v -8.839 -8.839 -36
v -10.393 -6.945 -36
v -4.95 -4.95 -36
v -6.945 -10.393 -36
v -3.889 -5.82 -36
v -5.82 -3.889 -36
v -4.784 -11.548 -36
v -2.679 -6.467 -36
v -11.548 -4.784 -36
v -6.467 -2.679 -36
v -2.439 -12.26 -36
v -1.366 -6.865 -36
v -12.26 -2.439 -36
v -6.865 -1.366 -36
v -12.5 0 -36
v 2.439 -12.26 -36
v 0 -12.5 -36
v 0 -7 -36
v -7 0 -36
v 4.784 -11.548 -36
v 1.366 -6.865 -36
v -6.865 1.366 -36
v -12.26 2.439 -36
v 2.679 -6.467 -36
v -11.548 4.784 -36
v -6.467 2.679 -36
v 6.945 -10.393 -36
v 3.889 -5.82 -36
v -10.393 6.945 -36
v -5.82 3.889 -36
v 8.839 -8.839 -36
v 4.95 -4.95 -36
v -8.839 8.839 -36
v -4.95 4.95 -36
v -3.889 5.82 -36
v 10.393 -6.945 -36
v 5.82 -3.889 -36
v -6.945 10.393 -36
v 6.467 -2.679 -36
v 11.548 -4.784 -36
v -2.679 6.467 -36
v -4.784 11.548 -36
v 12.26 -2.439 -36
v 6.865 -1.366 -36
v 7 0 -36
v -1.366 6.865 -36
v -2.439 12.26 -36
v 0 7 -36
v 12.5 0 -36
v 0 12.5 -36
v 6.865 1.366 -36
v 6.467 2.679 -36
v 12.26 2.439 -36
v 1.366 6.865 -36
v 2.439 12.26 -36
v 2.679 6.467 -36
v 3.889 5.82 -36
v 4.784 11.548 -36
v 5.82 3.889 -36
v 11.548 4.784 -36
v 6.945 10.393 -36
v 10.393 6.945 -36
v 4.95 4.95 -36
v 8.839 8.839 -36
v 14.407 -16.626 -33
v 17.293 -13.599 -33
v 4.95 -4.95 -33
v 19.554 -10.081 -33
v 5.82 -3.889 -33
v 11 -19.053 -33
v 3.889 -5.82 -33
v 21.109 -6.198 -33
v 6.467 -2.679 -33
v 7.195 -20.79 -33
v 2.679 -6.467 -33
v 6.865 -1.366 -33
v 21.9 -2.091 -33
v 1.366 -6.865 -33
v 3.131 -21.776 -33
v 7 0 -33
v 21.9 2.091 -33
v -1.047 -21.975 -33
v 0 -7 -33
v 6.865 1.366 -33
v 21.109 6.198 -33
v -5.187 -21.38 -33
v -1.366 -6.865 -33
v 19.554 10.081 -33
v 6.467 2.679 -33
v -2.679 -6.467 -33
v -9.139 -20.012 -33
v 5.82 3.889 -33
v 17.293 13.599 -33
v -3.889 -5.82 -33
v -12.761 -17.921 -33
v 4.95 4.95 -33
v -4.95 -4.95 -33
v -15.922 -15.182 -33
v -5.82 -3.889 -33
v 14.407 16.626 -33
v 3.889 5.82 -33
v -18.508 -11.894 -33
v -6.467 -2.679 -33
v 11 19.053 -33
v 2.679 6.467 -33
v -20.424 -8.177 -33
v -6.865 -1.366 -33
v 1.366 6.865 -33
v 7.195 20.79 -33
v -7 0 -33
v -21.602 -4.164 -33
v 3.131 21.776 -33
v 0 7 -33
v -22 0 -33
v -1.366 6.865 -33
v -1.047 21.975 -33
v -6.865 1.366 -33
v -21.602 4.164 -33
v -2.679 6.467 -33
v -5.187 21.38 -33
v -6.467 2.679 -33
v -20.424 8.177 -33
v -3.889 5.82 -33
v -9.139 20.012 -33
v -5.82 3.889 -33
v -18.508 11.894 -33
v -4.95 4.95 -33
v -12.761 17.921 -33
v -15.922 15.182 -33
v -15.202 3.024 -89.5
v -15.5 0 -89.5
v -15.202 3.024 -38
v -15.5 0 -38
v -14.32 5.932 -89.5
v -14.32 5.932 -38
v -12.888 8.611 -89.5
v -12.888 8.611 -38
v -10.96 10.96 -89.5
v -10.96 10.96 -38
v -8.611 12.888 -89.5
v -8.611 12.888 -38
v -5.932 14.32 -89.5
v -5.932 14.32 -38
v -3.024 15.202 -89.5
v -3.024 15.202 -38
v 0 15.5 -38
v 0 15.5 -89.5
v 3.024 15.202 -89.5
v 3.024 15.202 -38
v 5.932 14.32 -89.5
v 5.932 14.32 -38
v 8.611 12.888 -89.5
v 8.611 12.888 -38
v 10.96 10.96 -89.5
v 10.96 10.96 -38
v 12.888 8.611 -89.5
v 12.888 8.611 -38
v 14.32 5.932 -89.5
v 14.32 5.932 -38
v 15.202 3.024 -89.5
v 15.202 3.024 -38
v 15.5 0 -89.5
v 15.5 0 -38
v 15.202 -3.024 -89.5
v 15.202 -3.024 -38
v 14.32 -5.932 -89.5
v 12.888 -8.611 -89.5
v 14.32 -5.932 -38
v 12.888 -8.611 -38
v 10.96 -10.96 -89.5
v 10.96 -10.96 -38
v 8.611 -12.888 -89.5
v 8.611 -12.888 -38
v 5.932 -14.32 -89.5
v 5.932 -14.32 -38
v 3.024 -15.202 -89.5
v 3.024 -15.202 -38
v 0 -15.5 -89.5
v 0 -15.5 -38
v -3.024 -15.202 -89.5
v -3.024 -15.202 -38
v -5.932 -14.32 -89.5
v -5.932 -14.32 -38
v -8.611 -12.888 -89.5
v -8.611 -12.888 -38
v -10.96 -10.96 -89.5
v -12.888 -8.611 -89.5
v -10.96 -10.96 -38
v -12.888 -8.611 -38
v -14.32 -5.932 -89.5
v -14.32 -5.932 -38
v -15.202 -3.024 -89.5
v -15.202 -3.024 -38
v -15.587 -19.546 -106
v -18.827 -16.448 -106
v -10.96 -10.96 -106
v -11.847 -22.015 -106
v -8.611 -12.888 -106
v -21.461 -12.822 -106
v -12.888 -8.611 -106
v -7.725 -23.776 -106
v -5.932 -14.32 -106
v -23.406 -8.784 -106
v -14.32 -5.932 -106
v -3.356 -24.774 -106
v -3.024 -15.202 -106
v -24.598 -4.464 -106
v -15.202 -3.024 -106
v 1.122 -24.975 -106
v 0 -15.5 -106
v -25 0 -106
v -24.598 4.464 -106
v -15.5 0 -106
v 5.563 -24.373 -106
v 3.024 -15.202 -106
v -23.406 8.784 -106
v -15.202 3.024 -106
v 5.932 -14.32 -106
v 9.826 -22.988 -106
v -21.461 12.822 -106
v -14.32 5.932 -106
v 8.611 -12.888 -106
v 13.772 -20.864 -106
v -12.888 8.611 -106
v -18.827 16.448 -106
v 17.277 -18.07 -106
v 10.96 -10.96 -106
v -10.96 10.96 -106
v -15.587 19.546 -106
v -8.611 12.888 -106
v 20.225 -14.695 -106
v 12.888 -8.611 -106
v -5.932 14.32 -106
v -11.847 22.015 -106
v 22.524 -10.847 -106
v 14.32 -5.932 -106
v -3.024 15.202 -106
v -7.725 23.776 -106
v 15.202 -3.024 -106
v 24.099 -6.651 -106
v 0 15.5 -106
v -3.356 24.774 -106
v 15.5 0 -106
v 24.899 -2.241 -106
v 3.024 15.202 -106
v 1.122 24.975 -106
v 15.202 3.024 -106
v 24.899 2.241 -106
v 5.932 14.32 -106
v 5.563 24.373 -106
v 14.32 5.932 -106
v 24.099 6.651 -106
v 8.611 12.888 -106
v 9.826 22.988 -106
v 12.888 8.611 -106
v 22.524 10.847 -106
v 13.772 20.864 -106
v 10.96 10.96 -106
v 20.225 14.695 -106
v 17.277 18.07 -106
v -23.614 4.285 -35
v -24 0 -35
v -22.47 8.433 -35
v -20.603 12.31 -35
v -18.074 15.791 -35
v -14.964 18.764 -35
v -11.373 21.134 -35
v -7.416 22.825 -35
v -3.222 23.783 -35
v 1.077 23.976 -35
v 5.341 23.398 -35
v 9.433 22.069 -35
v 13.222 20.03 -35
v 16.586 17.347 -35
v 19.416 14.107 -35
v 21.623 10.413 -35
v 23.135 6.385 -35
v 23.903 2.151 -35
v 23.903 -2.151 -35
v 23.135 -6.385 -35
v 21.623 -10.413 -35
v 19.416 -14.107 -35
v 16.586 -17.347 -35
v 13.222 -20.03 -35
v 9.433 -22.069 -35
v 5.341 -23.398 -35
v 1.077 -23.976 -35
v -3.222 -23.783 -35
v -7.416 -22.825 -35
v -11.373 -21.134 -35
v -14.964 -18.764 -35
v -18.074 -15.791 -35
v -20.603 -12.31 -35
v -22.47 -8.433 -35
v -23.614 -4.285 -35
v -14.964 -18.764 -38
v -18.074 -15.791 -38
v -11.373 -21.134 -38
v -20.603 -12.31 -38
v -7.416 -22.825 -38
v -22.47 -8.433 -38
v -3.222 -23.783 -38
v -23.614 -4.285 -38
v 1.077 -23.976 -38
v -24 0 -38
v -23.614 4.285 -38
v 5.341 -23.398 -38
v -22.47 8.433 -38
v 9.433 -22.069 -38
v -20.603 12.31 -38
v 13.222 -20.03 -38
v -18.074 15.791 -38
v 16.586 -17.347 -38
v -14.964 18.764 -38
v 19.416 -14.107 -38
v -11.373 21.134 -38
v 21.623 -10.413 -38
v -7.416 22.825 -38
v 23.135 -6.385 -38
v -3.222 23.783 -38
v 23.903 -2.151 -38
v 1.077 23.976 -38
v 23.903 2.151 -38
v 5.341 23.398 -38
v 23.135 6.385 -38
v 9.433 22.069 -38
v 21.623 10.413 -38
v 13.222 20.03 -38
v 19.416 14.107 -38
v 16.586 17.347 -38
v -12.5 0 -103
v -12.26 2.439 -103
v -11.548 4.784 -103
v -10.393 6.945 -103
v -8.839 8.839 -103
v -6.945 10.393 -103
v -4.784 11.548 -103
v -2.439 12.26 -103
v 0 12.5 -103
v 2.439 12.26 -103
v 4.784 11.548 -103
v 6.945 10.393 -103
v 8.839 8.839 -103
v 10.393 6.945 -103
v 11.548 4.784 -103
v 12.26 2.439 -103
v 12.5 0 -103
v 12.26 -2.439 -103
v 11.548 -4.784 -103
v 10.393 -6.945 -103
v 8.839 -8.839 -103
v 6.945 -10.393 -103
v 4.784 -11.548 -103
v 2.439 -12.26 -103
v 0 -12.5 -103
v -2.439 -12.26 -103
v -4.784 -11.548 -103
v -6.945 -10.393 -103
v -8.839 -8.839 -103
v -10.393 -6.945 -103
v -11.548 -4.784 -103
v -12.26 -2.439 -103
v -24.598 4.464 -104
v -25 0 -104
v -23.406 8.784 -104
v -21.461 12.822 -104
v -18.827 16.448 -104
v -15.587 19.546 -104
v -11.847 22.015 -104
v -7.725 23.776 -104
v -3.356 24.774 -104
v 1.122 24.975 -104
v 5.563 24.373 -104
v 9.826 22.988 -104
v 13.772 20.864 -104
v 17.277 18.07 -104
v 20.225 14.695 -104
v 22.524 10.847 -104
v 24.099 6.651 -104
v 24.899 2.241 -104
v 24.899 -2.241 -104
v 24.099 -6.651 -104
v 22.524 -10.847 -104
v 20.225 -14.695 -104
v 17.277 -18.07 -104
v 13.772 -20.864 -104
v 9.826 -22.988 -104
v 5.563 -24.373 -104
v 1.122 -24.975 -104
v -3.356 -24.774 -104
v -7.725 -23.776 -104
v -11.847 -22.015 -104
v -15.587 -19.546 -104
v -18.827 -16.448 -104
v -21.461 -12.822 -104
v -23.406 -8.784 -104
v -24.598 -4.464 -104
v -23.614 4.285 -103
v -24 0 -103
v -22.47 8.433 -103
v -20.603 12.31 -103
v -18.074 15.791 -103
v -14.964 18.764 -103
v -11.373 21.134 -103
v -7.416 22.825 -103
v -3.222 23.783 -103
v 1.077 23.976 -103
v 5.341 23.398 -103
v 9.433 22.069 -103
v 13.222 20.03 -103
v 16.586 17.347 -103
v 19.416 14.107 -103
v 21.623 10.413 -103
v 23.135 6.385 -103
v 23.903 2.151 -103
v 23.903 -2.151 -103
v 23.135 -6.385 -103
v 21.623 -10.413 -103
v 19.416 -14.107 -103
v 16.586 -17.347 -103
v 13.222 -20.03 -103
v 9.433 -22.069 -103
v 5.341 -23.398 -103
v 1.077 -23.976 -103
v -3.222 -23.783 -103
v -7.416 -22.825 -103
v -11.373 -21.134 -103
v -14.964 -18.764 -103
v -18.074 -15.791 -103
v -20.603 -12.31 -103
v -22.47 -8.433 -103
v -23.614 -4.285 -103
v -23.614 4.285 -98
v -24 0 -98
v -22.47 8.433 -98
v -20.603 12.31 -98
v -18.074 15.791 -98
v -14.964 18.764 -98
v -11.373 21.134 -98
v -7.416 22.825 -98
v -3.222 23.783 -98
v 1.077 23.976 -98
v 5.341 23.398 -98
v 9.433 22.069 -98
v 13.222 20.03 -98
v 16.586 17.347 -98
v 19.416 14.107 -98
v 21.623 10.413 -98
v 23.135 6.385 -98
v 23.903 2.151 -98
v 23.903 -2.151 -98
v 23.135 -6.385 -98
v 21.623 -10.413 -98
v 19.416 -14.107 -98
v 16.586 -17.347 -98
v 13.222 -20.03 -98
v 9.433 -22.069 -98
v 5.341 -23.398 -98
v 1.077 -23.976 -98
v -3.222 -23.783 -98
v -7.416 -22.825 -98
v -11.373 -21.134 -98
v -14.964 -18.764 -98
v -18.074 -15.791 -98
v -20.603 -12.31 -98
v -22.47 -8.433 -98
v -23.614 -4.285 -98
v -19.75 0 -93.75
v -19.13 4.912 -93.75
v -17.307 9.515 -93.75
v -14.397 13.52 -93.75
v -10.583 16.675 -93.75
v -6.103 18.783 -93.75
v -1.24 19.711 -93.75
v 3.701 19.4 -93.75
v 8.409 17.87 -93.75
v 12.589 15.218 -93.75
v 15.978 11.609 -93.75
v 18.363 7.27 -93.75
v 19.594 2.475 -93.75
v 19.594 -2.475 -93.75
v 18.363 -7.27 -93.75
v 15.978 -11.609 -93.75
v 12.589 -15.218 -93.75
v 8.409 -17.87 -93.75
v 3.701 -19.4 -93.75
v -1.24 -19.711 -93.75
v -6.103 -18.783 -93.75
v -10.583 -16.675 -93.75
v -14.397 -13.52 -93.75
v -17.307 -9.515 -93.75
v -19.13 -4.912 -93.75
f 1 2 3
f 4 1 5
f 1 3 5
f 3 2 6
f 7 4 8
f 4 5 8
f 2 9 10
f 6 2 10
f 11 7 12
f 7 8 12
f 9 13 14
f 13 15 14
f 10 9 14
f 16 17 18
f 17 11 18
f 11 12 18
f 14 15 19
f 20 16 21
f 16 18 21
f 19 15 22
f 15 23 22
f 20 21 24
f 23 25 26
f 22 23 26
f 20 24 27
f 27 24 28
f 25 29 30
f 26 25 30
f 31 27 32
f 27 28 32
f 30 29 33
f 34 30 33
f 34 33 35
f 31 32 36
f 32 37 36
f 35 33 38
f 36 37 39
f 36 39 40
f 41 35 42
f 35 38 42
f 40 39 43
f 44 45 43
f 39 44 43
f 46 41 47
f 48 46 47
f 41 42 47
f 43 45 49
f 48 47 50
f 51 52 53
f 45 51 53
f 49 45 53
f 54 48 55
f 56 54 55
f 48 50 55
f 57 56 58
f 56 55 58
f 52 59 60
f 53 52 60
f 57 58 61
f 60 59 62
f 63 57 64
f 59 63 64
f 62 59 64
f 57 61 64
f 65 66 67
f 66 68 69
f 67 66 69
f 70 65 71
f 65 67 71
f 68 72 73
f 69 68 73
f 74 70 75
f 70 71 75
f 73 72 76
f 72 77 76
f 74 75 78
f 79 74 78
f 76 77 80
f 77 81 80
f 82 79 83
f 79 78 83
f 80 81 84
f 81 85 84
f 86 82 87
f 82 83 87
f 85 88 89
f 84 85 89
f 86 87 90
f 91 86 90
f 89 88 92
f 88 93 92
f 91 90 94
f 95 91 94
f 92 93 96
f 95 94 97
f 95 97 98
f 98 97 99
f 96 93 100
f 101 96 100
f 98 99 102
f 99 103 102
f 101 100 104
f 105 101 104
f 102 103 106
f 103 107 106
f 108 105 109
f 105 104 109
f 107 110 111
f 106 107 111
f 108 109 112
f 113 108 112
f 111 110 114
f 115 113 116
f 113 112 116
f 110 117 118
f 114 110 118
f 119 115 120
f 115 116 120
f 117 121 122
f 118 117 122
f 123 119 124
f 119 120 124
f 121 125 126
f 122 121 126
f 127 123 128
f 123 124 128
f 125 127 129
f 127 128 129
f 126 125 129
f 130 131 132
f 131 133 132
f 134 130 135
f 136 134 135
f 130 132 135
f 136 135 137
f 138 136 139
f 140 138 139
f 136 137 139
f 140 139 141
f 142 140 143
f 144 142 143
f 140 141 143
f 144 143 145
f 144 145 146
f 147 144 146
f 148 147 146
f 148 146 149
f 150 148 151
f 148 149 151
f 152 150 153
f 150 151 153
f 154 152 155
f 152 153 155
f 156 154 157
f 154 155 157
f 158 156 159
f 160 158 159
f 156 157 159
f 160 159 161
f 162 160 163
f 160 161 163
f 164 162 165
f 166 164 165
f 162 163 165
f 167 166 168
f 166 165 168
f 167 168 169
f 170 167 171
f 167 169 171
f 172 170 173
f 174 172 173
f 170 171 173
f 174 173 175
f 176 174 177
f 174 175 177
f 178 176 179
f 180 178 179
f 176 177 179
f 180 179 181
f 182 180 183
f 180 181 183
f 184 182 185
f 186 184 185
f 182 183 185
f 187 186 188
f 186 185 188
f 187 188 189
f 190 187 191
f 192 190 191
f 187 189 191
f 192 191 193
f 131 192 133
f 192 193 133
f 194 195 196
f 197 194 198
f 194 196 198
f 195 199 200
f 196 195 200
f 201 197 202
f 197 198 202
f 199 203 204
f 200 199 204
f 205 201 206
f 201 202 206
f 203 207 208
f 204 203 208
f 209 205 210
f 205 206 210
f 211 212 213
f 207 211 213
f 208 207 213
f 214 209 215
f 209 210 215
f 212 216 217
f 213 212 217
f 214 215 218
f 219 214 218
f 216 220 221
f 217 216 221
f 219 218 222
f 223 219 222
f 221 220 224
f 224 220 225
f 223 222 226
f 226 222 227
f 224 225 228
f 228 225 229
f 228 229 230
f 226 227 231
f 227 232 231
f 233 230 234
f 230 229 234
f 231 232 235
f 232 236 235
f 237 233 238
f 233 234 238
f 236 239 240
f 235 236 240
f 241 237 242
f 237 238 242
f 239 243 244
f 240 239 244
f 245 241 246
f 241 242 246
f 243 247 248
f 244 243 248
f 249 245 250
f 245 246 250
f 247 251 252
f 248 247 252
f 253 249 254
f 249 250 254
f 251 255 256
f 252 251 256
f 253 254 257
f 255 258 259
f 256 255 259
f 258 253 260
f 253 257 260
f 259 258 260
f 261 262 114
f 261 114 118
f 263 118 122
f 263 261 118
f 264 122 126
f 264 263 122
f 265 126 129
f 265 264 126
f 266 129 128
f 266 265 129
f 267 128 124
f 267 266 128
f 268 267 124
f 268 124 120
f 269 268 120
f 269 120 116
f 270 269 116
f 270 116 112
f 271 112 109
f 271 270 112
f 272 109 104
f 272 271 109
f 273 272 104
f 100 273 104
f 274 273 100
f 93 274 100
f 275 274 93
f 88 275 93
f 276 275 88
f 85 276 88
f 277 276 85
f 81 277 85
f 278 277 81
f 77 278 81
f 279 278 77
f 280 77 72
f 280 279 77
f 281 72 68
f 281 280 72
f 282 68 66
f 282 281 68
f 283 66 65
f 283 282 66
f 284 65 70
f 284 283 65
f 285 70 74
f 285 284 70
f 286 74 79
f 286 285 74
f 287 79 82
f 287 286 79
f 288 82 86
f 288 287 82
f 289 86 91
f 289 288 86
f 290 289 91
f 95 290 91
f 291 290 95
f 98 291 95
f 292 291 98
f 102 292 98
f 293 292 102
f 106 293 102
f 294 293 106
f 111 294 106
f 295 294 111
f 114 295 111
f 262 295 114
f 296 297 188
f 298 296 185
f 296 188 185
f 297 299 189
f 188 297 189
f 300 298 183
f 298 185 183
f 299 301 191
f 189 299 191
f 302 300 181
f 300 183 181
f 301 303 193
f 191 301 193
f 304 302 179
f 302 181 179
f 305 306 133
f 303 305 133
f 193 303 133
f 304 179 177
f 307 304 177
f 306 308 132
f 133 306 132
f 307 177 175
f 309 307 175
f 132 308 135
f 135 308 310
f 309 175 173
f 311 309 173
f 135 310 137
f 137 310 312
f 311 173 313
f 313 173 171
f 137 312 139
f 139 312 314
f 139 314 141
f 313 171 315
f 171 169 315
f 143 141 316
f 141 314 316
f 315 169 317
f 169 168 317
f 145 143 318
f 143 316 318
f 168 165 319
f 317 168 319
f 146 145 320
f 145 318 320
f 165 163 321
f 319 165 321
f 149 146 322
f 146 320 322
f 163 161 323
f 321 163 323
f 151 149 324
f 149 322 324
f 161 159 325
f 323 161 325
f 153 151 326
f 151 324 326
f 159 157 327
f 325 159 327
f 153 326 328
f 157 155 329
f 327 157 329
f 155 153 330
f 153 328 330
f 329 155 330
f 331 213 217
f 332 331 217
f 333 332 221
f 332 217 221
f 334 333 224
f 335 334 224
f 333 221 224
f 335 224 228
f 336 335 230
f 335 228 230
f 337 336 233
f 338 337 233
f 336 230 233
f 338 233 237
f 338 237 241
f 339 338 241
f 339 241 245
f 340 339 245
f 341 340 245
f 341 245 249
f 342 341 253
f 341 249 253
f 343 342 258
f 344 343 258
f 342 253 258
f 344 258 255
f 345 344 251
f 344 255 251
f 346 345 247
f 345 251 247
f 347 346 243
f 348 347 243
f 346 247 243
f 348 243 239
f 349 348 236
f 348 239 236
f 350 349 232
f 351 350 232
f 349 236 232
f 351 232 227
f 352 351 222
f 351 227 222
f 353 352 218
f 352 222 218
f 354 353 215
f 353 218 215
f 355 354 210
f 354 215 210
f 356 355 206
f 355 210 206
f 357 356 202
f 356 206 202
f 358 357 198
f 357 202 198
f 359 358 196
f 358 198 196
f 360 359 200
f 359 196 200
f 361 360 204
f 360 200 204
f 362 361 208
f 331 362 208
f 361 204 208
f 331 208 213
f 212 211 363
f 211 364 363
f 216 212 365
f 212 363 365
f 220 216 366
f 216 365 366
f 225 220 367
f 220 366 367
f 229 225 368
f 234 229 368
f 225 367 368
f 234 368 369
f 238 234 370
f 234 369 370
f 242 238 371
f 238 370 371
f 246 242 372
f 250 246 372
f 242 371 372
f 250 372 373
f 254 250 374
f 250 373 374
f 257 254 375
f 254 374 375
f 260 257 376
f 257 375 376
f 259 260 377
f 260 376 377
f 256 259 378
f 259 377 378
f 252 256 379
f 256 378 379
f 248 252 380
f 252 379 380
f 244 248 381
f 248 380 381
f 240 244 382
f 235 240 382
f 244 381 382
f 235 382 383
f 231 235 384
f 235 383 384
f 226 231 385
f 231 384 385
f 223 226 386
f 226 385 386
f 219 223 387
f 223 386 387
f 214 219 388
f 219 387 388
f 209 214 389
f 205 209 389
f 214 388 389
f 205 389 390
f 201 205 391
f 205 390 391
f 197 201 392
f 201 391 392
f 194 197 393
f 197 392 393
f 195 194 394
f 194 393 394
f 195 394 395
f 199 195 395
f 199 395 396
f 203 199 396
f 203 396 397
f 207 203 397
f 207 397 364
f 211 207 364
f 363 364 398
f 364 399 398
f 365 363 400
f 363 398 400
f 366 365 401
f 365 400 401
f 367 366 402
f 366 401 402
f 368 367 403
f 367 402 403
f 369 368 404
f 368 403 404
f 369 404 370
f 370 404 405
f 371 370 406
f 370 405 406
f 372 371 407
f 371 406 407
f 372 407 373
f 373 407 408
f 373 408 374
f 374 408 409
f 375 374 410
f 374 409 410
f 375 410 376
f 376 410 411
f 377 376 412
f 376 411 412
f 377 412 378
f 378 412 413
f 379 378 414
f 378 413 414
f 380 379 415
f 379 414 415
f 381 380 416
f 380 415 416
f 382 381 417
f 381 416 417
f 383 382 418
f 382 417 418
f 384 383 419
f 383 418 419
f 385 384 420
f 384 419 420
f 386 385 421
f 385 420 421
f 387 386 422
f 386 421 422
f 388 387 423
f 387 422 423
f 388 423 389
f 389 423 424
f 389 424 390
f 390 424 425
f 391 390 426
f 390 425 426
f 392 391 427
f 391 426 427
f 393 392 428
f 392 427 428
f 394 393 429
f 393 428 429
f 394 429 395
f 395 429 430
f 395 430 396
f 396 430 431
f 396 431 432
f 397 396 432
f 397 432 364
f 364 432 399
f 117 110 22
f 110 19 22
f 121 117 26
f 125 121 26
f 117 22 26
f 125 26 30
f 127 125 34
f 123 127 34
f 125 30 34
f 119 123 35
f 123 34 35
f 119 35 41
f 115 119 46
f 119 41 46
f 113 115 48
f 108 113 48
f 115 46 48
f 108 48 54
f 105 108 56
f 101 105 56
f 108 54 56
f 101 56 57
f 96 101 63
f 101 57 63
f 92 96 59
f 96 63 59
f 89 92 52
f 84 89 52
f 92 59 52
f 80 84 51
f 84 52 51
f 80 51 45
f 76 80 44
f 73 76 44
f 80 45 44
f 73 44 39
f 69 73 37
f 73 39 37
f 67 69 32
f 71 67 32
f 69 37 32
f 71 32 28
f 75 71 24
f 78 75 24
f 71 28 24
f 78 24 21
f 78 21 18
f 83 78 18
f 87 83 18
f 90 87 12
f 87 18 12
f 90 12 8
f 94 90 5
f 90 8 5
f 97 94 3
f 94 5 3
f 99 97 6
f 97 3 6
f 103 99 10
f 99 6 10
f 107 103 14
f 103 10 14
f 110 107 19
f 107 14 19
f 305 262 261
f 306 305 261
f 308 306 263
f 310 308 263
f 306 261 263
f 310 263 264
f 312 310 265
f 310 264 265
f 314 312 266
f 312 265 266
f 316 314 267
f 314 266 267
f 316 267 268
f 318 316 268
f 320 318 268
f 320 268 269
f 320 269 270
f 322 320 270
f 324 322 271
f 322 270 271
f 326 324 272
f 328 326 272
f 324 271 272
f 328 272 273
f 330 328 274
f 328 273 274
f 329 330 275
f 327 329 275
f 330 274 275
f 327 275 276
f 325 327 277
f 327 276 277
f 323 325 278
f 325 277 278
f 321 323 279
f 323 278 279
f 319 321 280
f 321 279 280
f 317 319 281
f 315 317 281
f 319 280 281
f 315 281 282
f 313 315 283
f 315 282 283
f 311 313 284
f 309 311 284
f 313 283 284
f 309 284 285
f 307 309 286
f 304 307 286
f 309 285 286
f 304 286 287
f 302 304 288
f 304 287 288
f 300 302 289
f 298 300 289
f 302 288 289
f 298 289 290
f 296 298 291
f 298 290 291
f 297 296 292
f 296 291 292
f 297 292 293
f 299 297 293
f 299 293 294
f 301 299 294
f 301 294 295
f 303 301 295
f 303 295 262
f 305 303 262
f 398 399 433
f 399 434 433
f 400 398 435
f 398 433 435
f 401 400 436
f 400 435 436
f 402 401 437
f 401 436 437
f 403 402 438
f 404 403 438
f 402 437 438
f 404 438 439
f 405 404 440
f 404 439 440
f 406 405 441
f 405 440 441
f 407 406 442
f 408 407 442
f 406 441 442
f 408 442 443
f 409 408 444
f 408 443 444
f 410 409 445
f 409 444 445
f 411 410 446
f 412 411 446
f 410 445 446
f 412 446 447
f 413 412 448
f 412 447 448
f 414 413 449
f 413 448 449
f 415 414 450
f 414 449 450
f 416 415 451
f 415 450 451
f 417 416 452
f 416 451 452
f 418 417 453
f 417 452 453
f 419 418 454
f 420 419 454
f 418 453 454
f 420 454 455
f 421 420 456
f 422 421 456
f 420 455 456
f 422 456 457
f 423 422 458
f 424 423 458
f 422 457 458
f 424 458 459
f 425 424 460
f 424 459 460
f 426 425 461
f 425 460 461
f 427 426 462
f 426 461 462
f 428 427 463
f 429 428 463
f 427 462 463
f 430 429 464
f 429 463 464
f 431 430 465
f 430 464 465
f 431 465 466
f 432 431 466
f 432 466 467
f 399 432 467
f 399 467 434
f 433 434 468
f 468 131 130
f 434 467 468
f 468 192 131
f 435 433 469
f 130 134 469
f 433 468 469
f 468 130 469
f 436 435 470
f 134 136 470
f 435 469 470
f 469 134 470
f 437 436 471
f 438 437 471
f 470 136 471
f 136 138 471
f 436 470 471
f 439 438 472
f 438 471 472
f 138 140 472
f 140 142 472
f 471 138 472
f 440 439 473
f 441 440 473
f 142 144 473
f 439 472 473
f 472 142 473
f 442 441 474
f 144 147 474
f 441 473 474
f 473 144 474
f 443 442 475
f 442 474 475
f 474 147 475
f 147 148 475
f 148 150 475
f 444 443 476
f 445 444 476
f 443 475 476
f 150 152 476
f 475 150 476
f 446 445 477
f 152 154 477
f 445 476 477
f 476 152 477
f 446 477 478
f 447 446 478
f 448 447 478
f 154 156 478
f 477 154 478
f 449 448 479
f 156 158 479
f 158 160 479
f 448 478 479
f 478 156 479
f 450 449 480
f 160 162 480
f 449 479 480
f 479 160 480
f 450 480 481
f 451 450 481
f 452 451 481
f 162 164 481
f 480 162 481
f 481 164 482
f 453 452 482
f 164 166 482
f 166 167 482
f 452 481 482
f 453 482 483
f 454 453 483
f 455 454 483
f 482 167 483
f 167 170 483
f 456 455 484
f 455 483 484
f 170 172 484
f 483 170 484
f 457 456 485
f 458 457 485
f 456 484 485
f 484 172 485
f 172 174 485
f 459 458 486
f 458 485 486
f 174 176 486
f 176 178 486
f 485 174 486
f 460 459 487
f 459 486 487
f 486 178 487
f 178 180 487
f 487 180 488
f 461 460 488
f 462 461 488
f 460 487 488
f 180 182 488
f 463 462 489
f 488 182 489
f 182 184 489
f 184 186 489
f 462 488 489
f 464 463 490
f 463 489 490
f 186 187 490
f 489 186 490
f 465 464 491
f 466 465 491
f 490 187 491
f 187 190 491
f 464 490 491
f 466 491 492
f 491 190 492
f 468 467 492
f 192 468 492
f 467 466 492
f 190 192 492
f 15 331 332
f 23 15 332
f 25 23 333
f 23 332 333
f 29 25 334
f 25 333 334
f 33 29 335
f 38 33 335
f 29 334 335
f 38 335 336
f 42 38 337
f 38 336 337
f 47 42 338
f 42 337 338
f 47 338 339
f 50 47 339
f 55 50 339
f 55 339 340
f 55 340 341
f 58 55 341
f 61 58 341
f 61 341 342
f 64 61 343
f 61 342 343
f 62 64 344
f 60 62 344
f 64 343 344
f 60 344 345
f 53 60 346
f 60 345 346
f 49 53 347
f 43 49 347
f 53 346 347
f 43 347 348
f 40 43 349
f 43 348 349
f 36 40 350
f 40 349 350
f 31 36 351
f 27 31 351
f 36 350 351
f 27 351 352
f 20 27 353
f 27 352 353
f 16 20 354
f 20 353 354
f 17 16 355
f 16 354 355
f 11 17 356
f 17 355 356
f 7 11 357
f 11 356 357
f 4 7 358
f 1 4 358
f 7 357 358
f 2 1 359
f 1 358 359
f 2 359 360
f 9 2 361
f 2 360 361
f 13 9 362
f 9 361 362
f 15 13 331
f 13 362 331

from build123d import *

# Parameters (mm, degrees)
CHAMFER_SIZE         = 3
CHAMFER001_SIZE      = 2
BODY_PLACEMENT_ANGLE = 180


with BuildPart() as part:
    # Sketch → Revolution (revolve)
    with BuildSketch(Plane.XZ):
        Polygon((24, 0), (7, 0), (7, 3), (12.5, 3), (12.5, 73), (25, 73), (25, 71), (24, 70), (24, 65), (15.5, 56.5), (15.5, 5), (24, 5), align=None)
    revolve(axis=Axis((0, 0, 0), (0, 0, 1)))

    # Chamfer
    chamfer_edges = [part.edges().sort_by_distance(p)[0] for p in [
        (-12.5, 0, 73),
    ]]
    chamfer(chamfer_edges, length=CHAMFER_SIZE)

    # Chamfer001
    chamfer001_edges = [part.edges().sort_by_distance(p)[0] for p in [
        (-24, 0, 0),
    ]]
    chamfer(chamfer001_edges, length=CHAMFER001_SIZE)


with BuildPart() as part_1:
    # Body placement: moved
    add(part.part.moved(Location((0, 0, -33))).rotate(Axis((0, 0, -33), (0, 1, 0)), BODY_PLACEMENT_ANGLE))


solid = part_1.part
